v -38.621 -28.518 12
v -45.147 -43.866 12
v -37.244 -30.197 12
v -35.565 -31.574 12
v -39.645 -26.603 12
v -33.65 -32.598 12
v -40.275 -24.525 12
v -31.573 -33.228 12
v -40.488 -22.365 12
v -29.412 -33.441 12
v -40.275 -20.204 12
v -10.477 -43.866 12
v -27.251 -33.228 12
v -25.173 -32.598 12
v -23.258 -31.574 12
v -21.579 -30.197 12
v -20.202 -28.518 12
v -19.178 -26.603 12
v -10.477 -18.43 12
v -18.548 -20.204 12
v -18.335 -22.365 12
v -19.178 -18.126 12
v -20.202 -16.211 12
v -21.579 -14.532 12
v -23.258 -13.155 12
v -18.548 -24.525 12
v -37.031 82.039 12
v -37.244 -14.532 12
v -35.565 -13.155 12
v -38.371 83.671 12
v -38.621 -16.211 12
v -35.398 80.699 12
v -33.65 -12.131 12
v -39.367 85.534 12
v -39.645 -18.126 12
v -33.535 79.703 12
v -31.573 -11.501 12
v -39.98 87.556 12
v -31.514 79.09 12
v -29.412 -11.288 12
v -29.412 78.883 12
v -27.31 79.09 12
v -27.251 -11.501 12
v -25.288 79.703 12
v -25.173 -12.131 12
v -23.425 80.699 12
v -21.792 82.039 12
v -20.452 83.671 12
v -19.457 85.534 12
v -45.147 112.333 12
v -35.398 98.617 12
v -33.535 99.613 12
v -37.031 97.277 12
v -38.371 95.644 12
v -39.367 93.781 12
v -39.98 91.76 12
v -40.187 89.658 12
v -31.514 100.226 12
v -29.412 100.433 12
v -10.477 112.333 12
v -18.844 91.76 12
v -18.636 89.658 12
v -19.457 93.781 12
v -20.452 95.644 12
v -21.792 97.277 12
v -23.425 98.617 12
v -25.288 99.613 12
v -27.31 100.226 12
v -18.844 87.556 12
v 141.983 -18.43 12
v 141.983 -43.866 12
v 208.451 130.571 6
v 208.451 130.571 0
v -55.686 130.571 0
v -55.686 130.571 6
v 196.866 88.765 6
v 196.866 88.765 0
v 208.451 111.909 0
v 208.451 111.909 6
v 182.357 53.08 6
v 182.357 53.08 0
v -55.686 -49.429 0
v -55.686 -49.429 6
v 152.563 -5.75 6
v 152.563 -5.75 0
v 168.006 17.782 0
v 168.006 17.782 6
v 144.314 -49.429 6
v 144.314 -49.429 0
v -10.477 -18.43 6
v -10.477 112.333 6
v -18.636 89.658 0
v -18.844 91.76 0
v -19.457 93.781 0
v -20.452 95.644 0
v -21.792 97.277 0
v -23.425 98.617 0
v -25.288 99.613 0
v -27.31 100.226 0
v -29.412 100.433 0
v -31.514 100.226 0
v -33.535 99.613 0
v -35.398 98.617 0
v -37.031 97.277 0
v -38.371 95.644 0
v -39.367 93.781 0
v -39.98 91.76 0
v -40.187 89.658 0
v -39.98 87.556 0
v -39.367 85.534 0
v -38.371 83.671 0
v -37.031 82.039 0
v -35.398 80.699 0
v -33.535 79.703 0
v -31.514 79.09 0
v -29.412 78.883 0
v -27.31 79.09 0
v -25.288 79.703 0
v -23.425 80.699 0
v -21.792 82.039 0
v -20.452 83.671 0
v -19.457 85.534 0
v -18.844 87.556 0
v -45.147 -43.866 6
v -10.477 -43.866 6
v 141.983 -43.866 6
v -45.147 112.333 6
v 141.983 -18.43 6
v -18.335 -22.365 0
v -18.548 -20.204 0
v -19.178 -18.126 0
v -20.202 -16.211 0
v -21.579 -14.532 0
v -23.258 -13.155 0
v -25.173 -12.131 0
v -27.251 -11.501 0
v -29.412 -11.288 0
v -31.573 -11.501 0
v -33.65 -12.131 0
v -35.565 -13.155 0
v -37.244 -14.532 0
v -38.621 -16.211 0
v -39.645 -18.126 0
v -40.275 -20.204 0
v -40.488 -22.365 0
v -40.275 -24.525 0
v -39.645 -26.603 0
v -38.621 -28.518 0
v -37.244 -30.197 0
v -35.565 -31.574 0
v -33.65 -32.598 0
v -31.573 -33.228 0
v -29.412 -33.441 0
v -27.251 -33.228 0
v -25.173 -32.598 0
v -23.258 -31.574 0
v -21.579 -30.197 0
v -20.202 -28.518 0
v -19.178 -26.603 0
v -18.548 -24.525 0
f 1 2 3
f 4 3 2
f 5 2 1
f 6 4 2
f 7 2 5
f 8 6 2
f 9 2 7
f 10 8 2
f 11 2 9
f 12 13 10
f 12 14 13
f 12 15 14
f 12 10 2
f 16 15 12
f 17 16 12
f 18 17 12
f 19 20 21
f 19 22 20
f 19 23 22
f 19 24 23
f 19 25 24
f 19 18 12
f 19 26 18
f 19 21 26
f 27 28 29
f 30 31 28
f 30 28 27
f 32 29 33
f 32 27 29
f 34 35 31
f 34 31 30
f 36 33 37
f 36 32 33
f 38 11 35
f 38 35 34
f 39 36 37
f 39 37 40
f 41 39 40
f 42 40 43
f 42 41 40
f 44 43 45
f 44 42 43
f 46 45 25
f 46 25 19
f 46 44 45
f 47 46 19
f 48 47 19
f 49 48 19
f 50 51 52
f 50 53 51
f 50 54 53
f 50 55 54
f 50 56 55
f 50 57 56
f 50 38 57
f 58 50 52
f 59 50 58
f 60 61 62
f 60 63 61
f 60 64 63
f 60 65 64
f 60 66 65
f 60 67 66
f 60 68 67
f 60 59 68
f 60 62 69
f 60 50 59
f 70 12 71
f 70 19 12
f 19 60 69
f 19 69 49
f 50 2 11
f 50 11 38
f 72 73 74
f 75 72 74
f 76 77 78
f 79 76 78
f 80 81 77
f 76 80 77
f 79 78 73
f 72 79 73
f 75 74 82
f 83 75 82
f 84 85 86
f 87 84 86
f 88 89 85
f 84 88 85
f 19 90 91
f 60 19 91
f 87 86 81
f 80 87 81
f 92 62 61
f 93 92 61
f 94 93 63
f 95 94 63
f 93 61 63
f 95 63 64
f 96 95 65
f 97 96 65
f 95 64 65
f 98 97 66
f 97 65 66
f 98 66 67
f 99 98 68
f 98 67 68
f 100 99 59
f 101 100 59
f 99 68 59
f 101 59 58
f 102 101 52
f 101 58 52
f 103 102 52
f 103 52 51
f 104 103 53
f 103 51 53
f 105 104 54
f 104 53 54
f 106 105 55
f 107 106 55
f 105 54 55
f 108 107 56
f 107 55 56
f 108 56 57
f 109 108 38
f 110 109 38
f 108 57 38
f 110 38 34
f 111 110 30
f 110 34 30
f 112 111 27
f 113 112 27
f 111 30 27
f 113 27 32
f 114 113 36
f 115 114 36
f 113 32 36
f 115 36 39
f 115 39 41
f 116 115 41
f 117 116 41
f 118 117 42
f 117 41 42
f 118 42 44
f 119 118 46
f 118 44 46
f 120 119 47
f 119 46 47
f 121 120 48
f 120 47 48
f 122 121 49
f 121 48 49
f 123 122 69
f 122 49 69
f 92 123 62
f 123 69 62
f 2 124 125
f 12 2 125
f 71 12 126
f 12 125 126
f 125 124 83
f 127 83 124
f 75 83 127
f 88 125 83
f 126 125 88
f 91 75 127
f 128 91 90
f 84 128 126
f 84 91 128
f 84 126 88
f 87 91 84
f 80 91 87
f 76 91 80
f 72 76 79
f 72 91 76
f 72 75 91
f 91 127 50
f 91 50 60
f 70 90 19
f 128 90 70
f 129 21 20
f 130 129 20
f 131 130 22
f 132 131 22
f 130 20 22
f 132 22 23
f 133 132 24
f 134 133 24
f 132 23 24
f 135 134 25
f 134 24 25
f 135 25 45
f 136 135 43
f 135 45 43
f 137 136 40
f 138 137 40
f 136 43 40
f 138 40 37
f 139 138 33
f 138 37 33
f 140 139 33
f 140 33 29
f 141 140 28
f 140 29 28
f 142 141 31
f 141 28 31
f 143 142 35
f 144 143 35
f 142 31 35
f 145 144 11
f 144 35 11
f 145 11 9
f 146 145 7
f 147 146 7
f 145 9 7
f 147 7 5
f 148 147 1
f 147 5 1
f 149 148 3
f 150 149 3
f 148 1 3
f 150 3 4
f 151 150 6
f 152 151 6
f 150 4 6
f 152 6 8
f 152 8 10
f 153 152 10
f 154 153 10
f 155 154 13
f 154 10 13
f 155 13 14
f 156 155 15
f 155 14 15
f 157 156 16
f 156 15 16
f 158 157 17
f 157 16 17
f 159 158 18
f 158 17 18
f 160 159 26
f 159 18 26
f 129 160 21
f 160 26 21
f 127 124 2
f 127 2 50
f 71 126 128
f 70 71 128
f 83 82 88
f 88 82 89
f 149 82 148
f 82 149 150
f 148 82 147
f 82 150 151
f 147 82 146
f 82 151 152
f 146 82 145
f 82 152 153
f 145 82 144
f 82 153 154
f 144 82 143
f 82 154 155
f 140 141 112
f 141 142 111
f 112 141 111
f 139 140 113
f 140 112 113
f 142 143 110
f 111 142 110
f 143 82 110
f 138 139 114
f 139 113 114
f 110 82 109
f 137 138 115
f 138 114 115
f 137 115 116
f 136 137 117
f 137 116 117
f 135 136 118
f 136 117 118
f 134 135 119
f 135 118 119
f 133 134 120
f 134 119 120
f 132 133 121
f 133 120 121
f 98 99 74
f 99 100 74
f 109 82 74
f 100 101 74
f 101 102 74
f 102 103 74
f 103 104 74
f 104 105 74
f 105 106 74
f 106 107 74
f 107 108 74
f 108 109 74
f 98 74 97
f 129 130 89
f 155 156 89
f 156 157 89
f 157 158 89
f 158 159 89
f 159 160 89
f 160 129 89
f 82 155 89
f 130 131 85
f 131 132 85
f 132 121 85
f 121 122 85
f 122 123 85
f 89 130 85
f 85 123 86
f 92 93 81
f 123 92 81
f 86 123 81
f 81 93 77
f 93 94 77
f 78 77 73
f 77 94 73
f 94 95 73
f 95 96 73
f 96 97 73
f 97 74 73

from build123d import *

# Parameters (mm, degrees)
SALIENTE_EXTRUIR1_DEPTH = 6
CROQUIS2_W              = 34.669355488
CROQUIS2_H              = 156.198494079
SALIENTE_EXTRUIR2_DEPTH = 6
CROQUIS4_W              = 152.460808534
CROQUIS4_H              = 25.435907393
SALIENTE_EXTRUIR3_DEPTH = 6
CROQUIS5_R              = 11.076486621
CROQUIS5_R_2            = 10.775241997
CORTAR_EXTRUIR1_DEPTH   = 12


with BuildPart() as part:
    # Croquis1 → Saliente-Extruir1 (new body)
    with BuildSketch(Plane.XY):
        Polygon((182.356839795, 53.079696336), (196.865539042, 88.764755078), (208.451032663, 111.909466833), (208.451032663, 130.571133231), (182.356839795, 130.571133231), (-55.686414529, 130.571133231), (-55.686414529, -49.428866769), (144.313585471, -49.428866769), (152.562750691, -5.750074162), (168.005565446, 17.781834037), align=None)
    extrude(amount=SALIENTE_EXTRUIR1_DEPTH)

    # Croquis2 → Saliente-Extruir2 (add)
    with BuildSketch(Plane.XY.offset(6)):
        with Locations((-27.81215178, 34.233724164)):
            Rectangle(CROQUIS2_W, CROQUIS2_H)
    extrude(amount=SALIENTE_EXTRUIR2_DEPTH)

    # Croquis4 → Saliente-Extruir3 (add)
    with BuildSketch(Plane.XY.offset(6)):
        with Locations((65.752930231, -31.14756918)):
            Rectangle(CROQUIS4_W, CROQUIS4_H)
    extrude(amount=SALIENTE_EXTRUIR3_DEPTH)

    # Croquis5 → Cortar-Extruir1 (cut)
    with BuildSketch(Plane.XY.offset(12)):
        with Locations((-29.411710595, -22.364568106)):
            Circle(CROQUIS5_R)
        with Locations((-29.411710595, 89.657796537)):
            Circle(CROQUIS5_R_2)
    extrude(amount=-CORTAR_EXTRUIR1_DEPTH, mode=Mode.SUBTRACT)


solid = part.part
